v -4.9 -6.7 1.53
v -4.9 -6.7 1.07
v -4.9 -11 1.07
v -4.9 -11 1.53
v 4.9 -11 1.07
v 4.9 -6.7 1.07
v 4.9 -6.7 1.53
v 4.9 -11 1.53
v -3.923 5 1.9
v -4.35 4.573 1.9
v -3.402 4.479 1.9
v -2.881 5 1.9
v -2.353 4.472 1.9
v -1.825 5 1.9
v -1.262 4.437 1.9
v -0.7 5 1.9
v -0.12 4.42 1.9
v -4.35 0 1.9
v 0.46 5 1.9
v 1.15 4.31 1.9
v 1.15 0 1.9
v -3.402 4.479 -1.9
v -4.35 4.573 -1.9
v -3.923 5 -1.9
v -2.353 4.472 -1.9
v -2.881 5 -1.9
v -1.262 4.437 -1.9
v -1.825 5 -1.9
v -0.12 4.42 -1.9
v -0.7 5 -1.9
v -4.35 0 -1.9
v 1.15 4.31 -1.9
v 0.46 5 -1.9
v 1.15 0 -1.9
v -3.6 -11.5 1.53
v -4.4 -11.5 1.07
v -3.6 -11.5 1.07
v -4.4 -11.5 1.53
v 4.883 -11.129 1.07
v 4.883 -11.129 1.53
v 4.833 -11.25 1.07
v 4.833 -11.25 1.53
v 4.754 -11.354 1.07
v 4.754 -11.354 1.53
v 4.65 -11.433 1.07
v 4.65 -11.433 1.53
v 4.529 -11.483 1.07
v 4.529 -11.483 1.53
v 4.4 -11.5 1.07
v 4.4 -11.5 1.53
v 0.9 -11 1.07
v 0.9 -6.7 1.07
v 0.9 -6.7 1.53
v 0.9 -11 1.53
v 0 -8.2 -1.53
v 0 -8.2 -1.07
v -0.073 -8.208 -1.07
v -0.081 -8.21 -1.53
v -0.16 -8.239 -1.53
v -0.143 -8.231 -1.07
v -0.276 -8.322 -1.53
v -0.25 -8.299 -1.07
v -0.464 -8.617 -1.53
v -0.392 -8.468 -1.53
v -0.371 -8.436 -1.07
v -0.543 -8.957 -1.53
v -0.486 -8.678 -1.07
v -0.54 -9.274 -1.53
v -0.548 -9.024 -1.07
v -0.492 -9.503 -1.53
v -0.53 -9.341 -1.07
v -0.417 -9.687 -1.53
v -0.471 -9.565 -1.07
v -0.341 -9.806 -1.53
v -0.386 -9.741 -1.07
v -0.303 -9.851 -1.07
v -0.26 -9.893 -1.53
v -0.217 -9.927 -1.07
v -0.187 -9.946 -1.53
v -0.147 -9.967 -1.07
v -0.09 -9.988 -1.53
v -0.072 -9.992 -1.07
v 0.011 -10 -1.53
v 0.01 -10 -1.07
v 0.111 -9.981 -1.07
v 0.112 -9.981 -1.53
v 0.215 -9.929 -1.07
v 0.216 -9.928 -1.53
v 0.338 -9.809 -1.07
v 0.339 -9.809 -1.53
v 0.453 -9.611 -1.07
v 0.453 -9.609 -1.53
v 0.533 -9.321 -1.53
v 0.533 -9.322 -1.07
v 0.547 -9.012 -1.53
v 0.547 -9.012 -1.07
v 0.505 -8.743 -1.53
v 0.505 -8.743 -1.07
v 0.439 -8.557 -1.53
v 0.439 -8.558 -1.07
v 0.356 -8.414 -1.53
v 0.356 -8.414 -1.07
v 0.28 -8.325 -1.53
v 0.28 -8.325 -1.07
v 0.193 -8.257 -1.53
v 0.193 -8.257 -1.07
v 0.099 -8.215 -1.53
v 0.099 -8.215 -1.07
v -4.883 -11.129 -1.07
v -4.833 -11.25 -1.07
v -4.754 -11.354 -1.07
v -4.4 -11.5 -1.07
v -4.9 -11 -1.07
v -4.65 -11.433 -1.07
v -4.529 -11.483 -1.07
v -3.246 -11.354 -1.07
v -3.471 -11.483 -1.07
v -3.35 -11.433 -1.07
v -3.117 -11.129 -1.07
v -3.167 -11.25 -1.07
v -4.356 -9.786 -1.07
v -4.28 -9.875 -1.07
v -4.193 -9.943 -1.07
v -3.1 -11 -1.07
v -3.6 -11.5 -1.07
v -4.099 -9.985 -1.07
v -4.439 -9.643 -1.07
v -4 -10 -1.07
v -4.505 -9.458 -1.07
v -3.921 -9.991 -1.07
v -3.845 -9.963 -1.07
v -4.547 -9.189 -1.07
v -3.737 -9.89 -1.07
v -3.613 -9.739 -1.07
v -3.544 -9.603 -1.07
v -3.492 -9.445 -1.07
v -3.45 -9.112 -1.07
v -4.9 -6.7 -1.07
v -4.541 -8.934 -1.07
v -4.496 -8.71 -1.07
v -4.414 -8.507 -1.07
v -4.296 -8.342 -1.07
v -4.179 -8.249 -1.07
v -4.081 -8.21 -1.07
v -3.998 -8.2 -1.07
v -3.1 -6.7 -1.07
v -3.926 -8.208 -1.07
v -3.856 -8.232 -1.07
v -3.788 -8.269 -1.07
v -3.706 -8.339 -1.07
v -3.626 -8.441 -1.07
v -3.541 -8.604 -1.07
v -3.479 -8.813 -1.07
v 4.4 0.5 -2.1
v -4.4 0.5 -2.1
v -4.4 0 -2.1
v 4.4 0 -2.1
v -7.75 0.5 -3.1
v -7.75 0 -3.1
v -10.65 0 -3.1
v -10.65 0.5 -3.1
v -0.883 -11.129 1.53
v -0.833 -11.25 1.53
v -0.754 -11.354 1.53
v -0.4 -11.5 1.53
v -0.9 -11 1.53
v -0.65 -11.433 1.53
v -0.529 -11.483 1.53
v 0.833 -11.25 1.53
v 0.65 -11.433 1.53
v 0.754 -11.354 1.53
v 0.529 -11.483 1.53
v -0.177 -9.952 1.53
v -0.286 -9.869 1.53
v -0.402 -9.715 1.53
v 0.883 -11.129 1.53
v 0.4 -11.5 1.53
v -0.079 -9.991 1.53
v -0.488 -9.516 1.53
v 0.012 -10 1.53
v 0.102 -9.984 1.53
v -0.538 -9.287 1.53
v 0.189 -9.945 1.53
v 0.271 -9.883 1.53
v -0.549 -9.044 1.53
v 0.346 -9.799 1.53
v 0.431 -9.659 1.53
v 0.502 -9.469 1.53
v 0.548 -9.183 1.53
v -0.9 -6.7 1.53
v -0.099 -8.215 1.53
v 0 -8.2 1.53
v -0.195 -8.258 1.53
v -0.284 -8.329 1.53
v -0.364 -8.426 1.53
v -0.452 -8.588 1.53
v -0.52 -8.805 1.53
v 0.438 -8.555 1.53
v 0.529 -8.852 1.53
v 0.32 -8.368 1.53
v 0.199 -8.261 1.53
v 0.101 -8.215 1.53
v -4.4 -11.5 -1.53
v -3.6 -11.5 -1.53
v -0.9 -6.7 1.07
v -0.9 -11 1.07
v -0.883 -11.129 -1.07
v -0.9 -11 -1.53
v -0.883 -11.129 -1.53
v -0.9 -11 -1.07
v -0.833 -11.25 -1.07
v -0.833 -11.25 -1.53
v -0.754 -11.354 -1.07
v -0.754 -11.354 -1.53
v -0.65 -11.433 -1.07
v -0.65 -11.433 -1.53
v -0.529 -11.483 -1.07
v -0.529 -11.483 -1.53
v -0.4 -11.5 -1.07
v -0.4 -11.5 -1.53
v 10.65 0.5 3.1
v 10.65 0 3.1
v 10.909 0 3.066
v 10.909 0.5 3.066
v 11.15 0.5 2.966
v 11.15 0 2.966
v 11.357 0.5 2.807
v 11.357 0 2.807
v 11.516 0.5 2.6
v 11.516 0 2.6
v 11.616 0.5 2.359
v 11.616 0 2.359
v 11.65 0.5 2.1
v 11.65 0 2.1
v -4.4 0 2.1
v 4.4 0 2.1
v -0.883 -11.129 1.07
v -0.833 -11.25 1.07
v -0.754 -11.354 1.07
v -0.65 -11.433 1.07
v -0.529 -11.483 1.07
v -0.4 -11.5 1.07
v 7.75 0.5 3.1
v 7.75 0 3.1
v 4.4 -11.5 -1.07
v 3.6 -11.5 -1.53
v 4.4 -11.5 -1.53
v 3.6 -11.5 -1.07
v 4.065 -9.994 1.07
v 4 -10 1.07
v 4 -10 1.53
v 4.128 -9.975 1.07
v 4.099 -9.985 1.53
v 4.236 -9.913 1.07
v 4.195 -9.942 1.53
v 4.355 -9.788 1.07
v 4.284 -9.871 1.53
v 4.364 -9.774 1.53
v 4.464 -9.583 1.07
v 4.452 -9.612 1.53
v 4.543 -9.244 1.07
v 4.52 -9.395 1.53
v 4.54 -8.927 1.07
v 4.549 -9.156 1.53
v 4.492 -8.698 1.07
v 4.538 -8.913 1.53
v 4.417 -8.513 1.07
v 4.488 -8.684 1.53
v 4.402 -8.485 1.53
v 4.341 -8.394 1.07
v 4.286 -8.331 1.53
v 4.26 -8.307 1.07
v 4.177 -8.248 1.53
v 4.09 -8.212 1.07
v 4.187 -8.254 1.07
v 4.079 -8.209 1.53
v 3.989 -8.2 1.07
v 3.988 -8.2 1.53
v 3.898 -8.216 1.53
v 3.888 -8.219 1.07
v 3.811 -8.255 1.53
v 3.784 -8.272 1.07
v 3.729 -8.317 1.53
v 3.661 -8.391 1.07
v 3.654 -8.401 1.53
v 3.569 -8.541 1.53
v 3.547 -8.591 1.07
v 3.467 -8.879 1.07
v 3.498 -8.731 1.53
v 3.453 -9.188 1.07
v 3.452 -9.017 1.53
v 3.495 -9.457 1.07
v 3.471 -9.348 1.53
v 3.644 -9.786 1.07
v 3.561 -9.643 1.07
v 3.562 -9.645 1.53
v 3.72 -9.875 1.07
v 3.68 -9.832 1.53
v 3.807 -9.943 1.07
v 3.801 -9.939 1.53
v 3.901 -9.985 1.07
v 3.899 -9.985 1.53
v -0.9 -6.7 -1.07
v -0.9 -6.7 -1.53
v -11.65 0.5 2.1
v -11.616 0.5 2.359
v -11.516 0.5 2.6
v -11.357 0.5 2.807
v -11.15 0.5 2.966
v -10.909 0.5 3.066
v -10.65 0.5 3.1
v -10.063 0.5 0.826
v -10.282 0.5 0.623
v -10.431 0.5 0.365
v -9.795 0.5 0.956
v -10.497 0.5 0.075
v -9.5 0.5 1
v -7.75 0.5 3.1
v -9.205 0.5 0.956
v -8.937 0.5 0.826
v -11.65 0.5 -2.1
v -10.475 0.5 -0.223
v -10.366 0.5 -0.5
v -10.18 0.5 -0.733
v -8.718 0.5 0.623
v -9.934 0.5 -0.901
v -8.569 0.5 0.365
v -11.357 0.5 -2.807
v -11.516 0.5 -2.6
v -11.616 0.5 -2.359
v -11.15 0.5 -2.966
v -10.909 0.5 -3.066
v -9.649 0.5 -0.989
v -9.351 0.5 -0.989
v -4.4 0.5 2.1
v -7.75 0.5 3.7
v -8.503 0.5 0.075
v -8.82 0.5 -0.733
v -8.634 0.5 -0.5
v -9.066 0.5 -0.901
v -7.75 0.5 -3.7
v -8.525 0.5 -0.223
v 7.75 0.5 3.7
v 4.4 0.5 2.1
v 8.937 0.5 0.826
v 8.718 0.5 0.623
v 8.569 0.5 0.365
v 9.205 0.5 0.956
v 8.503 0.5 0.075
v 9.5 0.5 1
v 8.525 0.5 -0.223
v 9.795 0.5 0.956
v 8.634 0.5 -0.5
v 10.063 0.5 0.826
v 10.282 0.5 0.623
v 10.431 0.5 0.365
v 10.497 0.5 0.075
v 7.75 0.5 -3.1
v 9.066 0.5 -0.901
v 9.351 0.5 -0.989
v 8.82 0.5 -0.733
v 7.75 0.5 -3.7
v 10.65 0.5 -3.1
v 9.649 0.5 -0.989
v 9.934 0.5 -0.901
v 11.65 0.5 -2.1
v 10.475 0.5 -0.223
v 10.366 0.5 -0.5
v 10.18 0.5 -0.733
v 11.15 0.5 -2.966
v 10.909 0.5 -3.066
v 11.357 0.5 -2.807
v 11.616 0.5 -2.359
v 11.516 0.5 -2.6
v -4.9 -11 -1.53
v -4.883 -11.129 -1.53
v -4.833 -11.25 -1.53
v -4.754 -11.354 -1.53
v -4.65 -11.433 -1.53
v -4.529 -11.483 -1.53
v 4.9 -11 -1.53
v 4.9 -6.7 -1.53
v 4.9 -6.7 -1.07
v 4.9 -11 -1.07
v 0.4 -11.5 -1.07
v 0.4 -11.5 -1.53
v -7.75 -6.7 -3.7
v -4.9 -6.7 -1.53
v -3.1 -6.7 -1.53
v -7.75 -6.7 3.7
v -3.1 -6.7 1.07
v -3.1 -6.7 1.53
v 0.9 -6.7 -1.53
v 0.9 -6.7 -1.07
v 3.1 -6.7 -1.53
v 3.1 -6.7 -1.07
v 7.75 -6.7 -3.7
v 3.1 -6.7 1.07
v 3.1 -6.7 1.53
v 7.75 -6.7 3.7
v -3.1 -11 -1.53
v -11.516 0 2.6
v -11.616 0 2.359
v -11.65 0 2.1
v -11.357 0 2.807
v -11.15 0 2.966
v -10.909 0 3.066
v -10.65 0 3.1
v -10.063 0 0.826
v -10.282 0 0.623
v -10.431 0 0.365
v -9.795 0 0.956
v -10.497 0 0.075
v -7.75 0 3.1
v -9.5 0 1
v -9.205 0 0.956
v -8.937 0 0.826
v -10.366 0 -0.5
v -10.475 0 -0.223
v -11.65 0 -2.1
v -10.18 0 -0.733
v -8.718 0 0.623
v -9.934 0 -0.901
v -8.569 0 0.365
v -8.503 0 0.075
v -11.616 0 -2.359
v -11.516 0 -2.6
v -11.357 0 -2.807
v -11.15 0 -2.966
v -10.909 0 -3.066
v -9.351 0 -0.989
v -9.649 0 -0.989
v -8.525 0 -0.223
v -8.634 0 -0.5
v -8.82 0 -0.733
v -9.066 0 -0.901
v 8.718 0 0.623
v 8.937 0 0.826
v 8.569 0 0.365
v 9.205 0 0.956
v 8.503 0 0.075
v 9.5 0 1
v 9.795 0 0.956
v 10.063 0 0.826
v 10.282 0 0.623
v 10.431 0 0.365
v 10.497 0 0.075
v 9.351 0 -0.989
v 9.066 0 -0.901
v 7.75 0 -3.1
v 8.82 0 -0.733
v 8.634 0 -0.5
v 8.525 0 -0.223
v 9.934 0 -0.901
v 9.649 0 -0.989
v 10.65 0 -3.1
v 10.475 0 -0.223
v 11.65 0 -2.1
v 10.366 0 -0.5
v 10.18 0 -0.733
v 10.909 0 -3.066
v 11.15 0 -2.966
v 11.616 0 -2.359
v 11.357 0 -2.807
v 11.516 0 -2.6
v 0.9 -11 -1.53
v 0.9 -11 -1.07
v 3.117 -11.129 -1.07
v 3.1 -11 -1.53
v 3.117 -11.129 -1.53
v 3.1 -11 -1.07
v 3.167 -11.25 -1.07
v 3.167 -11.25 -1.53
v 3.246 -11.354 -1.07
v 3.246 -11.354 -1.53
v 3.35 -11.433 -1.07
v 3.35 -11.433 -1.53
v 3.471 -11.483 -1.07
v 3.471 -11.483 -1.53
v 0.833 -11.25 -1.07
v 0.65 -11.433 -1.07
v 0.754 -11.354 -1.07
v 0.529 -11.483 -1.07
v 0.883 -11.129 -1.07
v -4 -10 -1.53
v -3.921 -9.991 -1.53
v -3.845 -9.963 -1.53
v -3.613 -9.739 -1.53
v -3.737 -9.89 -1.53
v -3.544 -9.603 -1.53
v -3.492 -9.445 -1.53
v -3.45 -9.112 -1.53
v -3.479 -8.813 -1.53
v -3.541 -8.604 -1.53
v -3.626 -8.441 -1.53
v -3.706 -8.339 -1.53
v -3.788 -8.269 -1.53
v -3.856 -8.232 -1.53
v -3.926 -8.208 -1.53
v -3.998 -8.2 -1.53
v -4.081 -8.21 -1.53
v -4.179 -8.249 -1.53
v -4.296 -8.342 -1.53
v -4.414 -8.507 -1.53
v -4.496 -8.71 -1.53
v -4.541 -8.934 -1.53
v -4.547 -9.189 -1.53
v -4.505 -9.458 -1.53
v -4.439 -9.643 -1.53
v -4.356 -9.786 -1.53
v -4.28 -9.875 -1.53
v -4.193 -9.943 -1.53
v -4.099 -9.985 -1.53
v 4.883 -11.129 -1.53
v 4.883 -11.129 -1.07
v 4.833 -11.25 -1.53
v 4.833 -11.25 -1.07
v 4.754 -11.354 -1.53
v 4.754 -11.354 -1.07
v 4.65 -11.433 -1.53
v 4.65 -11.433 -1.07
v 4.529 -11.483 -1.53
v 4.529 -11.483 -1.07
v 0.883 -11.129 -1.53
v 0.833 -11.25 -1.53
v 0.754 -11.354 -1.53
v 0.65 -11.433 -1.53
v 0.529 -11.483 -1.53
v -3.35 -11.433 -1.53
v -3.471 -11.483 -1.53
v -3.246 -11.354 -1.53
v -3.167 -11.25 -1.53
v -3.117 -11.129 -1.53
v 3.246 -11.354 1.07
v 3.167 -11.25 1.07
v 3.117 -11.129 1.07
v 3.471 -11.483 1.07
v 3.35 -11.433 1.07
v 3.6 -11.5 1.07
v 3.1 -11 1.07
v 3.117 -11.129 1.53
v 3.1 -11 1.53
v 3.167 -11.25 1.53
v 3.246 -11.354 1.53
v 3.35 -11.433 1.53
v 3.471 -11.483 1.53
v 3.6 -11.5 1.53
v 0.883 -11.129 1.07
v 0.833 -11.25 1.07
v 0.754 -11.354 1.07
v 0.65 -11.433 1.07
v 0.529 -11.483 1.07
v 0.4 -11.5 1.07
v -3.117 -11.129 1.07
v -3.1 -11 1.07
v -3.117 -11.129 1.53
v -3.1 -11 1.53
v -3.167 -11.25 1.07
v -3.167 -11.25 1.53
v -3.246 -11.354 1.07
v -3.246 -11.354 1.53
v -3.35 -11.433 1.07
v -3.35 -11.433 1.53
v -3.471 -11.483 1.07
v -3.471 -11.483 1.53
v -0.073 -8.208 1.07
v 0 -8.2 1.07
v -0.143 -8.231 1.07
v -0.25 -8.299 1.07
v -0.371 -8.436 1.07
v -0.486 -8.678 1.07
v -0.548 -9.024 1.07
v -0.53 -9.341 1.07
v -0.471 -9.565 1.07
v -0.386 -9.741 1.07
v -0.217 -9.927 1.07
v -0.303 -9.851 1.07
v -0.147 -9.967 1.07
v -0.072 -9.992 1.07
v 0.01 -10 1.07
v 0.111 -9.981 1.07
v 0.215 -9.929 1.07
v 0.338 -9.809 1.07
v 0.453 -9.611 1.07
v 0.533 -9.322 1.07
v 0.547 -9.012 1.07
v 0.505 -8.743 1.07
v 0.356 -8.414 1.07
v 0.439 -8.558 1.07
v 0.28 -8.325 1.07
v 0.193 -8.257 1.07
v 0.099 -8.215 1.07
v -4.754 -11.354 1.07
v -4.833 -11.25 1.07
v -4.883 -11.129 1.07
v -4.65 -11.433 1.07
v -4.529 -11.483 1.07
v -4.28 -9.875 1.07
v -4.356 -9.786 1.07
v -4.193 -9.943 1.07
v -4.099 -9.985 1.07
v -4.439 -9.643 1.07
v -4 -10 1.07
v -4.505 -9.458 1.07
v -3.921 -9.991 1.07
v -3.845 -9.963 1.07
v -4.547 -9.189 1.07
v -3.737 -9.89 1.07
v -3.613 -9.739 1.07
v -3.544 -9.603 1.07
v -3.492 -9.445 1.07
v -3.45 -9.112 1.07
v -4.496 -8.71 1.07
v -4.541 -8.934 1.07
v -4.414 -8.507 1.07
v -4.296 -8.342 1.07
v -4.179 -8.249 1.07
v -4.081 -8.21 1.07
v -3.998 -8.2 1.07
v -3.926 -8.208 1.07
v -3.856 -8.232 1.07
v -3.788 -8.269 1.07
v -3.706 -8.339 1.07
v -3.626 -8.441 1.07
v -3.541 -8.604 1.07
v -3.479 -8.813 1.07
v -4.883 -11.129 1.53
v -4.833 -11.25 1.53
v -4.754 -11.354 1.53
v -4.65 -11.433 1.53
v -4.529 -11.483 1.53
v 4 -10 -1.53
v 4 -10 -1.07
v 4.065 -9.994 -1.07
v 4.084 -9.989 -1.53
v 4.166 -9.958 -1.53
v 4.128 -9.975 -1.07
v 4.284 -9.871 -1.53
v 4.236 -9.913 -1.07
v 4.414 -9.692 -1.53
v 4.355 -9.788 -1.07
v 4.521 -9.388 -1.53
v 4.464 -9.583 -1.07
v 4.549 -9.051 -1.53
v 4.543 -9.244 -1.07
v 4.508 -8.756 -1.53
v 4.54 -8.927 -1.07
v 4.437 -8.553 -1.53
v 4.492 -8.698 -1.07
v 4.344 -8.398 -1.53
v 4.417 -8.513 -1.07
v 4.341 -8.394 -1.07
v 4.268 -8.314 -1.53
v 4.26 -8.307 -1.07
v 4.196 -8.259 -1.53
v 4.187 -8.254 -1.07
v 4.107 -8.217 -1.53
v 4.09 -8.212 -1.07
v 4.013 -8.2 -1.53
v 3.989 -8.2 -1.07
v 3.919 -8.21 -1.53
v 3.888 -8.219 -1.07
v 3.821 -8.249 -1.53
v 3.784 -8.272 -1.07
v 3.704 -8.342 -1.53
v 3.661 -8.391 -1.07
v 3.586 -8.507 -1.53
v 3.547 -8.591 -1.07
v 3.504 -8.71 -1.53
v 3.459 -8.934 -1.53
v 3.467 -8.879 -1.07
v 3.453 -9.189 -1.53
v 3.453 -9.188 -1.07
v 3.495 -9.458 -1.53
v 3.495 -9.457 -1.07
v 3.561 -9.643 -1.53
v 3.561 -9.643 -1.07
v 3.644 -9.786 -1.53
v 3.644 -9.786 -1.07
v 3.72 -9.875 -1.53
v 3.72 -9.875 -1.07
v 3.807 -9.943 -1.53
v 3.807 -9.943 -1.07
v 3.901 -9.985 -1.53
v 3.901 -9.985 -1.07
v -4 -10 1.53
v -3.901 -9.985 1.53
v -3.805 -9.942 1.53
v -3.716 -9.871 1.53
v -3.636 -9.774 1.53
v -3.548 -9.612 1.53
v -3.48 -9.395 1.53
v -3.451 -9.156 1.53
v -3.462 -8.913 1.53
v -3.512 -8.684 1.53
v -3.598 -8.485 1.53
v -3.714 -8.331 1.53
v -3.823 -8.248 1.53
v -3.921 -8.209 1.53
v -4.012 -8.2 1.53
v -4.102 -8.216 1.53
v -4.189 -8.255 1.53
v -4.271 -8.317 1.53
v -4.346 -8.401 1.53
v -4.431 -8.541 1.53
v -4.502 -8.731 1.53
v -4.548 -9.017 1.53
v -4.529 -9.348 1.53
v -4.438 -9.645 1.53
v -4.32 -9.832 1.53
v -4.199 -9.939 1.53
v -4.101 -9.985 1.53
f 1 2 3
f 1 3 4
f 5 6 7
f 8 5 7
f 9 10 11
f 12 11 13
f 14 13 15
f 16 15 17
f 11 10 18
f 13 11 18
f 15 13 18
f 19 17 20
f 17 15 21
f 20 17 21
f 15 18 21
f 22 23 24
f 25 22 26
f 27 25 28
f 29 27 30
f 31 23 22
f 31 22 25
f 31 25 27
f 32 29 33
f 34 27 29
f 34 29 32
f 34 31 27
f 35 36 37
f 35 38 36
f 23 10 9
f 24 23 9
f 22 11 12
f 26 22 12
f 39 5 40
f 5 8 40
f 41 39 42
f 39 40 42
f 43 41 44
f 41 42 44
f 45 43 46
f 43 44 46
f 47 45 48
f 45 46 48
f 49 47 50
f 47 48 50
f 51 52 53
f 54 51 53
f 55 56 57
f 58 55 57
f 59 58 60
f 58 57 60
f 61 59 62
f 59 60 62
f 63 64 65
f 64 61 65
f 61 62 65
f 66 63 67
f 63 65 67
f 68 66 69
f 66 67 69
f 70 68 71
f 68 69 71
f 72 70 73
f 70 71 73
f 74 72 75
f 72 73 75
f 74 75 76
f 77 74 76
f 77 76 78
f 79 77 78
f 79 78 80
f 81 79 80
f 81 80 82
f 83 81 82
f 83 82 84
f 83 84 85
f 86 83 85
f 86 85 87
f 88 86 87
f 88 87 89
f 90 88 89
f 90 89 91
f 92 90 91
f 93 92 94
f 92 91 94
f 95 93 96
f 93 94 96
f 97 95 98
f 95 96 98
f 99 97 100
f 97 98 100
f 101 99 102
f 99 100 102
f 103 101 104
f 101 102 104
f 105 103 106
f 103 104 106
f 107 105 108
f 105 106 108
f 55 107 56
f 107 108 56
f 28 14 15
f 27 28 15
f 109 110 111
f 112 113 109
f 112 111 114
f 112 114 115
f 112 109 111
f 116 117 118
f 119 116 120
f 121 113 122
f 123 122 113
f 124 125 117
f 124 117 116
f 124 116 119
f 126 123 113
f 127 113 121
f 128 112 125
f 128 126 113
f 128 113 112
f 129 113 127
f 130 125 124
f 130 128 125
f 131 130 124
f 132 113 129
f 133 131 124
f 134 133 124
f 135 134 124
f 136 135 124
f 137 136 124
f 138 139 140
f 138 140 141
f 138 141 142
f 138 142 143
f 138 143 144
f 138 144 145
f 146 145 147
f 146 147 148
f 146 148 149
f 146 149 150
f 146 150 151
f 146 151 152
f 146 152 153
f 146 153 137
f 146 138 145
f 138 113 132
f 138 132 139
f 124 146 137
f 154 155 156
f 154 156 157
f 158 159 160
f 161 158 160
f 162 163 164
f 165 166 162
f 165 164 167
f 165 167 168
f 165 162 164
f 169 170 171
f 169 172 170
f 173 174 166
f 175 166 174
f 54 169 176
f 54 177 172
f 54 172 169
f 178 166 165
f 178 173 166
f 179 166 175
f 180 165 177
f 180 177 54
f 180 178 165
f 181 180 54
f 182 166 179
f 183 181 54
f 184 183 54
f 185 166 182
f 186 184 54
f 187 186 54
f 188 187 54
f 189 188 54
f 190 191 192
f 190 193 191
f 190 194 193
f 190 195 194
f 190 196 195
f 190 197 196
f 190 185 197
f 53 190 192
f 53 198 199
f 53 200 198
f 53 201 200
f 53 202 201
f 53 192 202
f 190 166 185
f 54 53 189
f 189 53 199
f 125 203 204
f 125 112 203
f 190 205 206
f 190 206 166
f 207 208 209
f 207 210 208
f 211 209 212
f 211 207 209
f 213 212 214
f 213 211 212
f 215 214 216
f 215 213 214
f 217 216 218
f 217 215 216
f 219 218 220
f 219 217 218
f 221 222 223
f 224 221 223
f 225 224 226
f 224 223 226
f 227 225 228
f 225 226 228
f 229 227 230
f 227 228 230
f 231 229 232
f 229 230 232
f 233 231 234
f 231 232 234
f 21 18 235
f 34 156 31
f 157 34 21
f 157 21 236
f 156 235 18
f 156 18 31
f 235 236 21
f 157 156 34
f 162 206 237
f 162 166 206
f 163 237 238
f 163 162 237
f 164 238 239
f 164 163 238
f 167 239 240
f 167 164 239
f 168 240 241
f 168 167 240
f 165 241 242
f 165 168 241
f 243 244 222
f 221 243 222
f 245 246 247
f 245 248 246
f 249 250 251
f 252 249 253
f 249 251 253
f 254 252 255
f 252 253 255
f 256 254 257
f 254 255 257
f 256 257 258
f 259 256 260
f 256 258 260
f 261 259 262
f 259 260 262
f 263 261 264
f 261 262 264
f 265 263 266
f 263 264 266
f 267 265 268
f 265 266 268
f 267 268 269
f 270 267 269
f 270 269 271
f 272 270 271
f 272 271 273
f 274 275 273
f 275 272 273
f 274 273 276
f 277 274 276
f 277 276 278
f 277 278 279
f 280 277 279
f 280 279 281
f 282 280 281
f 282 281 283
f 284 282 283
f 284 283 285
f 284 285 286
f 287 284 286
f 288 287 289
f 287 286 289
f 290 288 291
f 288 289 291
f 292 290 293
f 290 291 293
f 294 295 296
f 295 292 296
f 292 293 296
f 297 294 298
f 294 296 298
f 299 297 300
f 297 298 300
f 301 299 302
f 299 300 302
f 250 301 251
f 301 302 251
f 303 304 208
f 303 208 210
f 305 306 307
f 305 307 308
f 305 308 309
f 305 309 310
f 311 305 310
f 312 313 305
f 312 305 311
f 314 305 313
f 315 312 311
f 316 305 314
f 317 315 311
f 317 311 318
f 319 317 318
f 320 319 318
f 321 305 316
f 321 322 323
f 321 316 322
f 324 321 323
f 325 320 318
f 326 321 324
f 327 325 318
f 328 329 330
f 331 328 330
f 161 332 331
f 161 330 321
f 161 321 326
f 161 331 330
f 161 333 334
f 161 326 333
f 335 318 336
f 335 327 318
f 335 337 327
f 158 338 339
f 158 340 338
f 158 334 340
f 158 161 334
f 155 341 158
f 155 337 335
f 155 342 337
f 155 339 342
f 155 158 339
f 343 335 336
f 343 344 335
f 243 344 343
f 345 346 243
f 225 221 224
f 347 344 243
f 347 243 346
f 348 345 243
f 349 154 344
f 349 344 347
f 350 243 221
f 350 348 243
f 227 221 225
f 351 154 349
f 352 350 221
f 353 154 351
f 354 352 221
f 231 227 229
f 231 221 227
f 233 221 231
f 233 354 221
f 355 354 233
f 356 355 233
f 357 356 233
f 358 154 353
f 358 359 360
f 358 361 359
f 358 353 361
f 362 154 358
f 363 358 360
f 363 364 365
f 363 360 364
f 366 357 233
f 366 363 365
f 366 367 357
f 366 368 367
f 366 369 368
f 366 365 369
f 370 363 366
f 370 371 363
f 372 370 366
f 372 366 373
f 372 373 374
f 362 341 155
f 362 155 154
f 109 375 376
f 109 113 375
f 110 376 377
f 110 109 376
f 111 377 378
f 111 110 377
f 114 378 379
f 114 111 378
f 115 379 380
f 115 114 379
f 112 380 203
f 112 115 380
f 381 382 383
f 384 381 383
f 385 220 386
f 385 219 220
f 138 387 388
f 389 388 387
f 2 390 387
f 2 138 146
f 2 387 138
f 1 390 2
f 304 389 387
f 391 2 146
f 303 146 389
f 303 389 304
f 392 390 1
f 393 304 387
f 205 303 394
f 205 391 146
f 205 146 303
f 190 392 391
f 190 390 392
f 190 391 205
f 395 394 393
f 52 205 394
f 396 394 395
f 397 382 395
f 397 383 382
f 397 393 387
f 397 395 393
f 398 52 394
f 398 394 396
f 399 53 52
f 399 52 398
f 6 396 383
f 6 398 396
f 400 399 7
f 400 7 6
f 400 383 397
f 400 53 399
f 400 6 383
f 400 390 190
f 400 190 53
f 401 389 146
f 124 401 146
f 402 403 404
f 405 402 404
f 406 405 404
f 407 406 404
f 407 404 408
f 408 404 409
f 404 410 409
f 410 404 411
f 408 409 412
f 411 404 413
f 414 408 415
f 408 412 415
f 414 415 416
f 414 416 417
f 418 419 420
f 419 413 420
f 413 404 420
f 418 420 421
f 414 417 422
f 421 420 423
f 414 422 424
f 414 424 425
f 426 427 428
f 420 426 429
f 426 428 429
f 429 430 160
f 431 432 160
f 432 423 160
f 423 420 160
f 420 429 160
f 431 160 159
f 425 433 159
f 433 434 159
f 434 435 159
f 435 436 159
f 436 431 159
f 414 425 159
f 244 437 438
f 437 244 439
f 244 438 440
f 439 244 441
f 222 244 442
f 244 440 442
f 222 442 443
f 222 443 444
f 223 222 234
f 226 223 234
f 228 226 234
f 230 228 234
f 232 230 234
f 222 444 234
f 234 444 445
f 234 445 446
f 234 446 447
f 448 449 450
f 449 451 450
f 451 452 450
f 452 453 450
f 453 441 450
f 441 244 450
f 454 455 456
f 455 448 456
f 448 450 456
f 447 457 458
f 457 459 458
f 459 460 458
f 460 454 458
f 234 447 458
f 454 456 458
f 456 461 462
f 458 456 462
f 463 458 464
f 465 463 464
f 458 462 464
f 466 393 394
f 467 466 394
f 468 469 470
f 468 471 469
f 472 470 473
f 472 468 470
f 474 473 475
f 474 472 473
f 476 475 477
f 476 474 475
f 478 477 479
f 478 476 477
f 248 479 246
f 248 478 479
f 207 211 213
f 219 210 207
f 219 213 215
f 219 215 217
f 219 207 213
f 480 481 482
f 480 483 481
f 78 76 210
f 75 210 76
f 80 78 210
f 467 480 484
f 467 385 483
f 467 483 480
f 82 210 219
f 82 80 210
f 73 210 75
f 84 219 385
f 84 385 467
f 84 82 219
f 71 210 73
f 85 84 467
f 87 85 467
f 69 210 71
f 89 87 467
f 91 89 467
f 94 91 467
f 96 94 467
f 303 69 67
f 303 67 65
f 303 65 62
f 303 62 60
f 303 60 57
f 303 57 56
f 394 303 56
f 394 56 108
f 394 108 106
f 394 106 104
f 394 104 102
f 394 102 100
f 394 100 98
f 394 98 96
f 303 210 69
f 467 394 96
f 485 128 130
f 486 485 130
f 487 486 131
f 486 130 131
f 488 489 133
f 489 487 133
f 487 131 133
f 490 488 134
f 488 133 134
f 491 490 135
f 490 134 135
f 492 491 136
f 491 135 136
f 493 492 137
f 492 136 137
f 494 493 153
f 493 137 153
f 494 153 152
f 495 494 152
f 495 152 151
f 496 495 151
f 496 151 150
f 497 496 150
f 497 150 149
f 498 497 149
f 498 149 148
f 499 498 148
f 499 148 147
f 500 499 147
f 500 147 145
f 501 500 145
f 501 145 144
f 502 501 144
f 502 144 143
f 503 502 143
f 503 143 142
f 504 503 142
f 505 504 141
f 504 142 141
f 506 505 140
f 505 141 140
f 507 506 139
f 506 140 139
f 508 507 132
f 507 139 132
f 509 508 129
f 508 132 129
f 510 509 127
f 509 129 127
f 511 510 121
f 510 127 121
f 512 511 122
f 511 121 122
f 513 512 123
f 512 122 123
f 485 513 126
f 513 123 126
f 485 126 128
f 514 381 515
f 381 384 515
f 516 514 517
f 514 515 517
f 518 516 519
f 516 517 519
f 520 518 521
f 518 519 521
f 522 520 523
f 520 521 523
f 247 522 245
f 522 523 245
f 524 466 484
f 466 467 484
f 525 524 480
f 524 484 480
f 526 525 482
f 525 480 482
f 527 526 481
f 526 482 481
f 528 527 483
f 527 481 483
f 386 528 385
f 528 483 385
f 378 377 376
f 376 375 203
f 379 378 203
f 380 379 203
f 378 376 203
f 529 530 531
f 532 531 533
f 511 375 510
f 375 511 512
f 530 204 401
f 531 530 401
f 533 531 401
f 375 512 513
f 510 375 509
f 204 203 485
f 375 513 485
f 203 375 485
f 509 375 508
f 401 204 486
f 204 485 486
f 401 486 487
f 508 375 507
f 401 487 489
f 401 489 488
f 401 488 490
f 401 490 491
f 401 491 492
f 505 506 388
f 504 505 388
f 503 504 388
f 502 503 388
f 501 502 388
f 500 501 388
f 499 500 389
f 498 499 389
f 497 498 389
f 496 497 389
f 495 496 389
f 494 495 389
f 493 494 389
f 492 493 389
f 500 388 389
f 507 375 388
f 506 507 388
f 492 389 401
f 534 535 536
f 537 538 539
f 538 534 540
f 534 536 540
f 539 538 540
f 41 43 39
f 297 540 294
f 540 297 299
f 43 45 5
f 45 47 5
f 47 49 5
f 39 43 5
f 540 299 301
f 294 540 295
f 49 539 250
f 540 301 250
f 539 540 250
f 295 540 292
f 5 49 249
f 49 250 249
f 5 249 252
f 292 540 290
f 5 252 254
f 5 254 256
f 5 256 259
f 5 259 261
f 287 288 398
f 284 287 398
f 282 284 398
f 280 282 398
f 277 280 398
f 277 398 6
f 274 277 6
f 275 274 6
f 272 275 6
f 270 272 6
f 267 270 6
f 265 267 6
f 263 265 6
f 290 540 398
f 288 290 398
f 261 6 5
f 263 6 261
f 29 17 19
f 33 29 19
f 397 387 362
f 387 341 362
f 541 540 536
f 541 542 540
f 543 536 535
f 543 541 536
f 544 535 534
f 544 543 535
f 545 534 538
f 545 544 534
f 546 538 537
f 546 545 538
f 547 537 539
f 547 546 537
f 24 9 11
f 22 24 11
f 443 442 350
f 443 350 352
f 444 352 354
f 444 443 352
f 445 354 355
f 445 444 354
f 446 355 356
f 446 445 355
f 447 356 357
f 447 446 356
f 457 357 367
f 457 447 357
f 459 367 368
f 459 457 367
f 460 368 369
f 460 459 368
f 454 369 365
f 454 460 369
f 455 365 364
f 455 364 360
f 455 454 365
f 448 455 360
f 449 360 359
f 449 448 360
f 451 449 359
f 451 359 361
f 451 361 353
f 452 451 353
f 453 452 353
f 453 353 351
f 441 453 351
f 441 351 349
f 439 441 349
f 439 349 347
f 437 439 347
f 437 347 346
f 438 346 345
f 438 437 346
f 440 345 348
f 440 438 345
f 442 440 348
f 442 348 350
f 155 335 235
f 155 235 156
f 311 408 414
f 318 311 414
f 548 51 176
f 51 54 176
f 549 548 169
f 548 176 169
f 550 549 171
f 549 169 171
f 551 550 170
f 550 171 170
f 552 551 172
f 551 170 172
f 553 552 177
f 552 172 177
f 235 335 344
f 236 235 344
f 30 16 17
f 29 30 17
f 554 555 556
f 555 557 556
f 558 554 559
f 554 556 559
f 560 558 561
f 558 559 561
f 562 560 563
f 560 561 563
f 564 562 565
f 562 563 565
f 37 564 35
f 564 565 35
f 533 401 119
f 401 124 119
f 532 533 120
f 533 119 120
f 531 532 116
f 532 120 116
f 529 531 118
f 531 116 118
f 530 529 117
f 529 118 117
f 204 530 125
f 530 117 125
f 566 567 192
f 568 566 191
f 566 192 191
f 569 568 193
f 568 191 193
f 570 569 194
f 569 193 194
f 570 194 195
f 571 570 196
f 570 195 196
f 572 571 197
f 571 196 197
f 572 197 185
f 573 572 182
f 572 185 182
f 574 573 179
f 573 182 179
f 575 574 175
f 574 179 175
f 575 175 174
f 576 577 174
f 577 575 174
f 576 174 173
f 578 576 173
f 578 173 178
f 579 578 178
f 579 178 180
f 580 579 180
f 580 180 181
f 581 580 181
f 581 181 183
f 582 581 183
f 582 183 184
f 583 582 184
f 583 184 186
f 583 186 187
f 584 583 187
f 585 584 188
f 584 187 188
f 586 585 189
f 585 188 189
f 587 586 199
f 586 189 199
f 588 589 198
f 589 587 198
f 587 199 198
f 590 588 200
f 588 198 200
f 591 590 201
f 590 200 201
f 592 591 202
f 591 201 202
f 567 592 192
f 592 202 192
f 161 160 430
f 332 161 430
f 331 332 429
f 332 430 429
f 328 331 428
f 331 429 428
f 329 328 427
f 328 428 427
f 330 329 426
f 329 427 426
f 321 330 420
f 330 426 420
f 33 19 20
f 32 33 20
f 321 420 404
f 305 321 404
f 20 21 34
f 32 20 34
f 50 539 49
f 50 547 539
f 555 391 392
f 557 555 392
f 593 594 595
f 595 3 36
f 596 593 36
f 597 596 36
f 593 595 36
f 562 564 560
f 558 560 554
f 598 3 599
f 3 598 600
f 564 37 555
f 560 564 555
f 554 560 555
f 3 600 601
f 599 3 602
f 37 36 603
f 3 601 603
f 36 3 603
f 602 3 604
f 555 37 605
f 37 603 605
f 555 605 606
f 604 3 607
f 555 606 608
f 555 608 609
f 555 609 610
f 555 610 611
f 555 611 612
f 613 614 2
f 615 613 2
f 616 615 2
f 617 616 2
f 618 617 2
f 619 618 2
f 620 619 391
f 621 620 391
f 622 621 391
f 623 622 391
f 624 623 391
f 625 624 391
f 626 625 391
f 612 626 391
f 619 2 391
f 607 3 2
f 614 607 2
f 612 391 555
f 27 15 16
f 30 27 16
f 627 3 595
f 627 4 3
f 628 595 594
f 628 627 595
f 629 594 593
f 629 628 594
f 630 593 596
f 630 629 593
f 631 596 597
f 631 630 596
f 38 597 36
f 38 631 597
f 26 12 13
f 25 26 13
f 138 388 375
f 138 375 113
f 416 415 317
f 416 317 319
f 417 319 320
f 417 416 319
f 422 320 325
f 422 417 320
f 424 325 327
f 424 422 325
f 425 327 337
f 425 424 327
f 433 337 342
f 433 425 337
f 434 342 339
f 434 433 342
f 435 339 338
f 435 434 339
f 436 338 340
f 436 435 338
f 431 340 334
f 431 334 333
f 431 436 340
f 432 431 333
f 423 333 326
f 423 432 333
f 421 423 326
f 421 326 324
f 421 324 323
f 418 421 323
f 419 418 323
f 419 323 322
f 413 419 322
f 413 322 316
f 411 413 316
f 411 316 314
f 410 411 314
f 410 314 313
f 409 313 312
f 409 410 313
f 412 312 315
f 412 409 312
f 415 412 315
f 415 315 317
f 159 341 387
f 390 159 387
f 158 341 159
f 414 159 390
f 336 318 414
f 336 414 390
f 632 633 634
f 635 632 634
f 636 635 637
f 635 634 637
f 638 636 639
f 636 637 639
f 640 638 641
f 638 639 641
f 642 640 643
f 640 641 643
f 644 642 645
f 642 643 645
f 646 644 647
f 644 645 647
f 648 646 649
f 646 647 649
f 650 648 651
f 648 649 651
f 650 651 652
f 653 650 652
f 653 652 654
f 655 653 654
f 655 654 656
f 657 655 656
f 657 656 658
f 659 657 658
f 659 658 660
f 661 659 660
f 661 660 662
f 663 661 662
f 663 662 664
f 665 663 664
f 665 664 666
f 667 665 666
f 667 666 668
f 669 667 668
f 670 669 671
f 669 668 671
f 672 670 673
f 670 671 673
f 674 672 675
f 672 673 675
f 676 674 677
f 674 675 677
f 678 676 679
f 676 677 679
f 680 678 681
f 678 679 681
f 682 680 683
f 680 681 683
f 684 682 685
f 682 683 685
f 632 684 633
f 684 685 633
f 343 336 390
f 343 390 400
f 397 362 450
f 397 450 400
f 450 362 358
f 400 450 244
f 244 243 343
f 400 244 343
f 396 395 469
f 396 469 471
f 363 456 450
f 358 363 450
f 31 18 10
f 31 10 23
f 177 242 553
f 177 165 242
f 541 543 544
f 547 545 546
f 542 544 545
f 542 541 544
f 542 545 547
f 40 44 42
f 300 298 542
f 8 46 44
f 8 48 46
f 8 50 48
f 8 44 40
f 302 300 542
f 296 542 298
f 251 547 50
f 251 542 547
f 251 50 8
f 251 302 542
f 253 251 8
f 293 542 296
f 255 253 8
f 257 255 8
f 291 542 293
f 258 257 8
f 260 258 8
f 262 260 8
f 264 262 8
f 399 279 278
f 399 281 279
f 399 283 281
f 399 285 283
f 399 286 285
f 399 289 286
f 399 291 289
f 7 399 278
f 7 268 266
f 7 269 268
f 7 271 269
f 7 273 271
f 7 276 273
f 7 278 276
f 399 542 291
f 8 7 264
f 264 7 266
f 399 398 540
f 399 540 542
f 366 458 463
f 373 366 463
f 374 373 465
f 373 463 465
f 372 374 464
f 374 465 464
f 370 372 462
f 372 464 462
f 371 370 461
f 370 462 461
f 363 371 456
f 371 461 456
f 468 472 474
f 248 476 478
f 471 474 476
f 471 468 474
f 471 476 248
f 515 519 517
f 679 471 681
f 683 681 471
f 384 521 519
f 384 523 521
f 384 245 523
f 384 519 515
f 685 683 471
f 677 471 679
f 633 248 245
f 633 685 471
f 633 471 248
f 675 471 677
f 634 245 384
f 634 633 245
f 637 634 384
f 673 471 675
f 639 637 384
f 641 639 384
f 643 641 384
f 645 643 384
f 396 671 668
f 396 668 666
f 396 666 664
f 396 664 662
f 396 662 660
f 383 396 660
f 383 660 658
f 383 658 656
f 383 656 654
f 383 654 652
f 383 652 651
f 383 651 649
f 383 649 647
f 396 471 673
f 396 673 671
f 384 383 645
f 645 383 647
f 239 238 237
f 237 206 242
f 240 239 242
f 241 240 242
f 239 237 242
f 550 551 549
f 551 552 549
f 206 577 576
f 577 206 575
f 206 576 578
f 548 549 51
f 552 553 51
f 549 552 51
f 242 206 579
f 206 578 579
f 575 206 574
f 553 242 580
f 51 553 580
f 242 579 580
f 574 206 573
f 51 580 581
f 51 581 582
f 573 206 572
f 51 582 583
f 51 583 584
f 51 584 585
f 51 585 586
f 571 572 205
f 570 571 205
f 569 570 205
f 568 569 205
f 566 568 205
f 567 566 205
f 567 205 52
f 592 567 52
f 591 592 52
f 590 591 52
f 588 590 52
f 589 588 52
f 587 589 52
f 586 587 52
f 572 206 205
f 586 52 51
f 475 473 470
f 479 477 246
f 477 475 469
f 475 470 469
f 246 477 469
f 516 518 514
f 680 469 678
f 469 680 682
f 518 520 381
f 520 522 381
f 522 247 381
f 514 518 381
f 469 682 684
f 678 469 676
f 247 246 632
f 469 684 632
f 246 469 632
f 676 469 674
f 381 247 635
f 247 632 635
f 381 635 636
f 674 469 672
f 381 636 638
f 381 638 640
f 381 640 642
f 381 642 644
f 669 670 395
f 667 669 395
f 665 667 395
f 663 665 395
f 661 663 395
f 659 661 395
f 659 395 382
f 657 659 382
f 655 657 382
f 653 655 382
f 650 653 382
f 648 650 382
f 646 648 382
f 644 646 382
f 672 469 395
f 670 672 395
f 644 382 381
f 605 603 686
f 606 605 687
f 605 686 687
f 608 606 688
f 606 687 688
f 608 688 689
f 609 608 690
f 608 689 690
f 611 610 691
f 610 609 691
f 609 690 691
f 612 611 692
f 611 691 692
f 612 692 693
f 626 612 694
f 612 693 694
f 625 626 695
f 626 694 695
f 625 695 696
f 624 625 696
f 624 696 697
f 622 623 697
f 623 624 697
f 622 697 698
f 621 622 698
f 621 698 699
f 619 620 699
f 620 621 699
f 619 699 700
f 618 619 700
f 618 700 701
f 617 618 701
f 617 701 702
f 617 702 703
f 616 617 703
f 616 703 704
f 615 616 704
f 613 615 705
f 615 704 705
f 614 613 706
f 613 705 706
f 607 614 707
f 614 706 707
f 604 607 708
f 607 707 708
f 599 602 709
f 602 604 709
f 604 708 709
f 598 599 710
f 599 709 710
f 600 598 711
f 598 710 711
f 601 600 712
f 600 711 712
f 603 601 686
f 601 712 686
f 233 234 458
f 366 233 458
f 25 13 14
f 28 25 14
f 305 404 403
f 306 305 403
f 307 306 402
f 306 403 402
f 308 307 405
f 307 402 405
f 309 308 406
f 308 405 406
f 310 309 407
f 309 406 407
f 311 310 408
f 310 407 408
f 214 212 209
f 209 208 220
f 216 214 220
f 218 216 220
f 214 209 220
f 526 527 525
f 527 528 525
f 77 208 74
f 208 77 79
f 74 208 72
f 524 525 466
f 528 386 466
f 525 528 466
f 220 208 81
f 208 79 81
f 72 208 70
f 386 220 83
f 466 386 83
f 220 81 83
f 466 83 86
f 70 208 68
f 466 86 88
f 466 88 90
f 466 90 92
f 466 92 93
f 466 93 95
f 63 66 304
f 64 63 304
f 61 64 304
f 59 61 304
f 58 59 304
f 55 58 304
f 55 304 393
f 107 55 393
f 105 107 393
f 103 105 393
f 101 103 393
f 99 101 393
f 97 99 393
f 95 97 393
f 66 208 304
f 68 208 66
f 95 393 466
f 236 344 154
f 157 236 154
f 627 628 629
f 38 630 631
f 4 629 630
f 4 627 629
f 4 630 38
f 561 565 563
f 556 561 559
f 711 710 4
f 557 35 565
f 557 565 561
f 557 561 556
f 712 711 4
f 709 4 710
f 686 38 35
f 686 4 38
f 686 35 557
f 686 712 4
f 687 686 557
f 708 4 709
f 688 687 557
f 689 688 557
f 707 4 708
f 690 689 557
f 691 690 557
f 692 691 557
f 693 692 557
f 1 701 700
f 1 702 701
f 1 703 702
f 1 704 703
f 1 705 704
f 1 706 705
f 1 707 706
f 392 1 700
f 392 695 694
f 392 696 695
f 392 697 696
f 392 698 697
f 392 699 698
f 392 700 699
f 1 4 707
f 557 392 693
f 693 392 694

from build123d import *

# Parameters (mm, degrees)
CROQUIS1_R              = 1
SALIENTE_EXTRUIR1_DEPTH = 0.5
CROQUIS2_W              = 15.5
CROQUIS2_H              = 7.4
SALIENTE_EXTRUIR2_DEPTH = 6.7
CROQUIS3_W              = 1.8
CROQUIS3_H              = 0.46
SALIENTE_EXTRUIR3_DEPTH = 4.8
CROQUIS4_W              = 8.8
CROQUIS4_H              = 4.2
CORTAR_EXTRUIR1_DEPTH   = 0.5
CROQUIS5_W              = 5.5
CROQUIS5_H              = 3.8
SALIENTE_EXTRUIR4_DEPTH = 5
CORTAR_EXTRUIR2_REACH   = 19.185
CROQUIS6_RX             = 0.9
CROQUIS6_RY             = 0.55
REDONDEO2_R             = 0.5
CORTAR_EXTRUIR3_REACH   = 19.301


with BuildPart() as part:
    # Croquis1 → Saliente-Extruir1 (new body)
    with BuildSketch(Plane(origin=(0, 0, 0), x_dir=(1, 0, 0), z_dir=(0, 1, 0))):
        with BuildLine():
            Line((10.65, 3.1), (7.75, 3.1))
            Line((7.75, 3.1), (7.75, 3.7))
            Line((7.75, 3.7), (-7.75, 3.7))
            Line((-7.75, 3.7), (-7.75, 3.1))
            Line((-7.75, 3.1), (-10.65, 3.1))
            ThreePointArc((-10.65, 3.1), (-11.357106781, 2.807106781), (-11.65, 2.1))
            Line((-11.65, 2.1), (-11.65, -2.1))
            ThreePointArc((-11.65, -2.1), (-11.357106781, -2.807106781), (-10.65, -3.1))
            Line((-10.65, -3.1), (-7.75, -3.1))
            Line((-7.75, -3.1), (-7.75, -3.7))
            Line((-7.75, -3.7), (7.75, -3.7))
            Line((7.75, -3.7), (7.75, -3.1))
            Line((7.75, -3.1), (10.65, -3.1))
            ThreePointArc((10.65, -3.1), (11.357106781, -2.807106781), (11.65, -2.1))
            Line((11.65, -2.1), (11.65, 2.1))
            ThreePointArc((11.65, 2.1), (11.357106781, 2.807106781), (10.65, 3.1))
        make_face()
        with Locations(Location((9.5, 0, 0), (0, 0, 270))):
            Circle(CROQUIS1_R, mode=Mode.SUBTRACT)
        with Locations(Location((-9.5, 0, 0), (0, 0, 270))):
            Circle(CROQUIS1_R, mode=Mode.SUBTRACT)
    extrude(amount=SALIENTE_EXTRUIR1_DEPTH)

    # Croquis2 → Saliente-Extruir2 (add)
    with BuildSketch(Plane.XZ):
        Rectangle(CROQUIS2_W, CROQUIS2_H)
    extrude(amount=SALIENTE_EXTRUIR2_DEPTH)

    # Croquis3 → Saliente-Extruir3 (add)
    with BuildSketch(Plane.XZ.offset(6.7)):
        with Locations((0, -1.3)):
            Rectangle(CROQUIS3_W, CROQUIS3_H)
        with Locations((-4, -1.3)):
            Rectangle(CROQUIS3_W, CROQUIS3_H)
        with Locations((4, -1.3)):
            Rectangle(CROQUIS3_W, CROQUIS3_H)
        with Locations((4, 1.3)):
            Rectangle(CROQUIS3_W, CROQUIS3_H)
        with Locations((-4, 1.3)):
            Rectangle(CROQUIS3_W, CROQUIS3_H)
        with Locations((0, 1.3)):
            Rectangle(CROQUIS3_W, CROQUIS3_H)
    extrude(amount=SALIENTE_EXTRUIR3_DEPTH)

    # Croquis4 → Cortar-Extruir1 (cut)
    with BuildSketch(Plane(origin=(0, 0.5, 0), x_dir=(1, 0, 0), z_dir=(0, 1, 0))):
        Rectangle(CROQUIS4_W, CROQUIS4_H)
    extrude(amount=-CORTAR_EXTRUIR1_DEPTH, mode=Mode.SUBTRACT)

    # Croquis5 → Saliente-Extruir4 (add)
    with BuildSketch(Plane(origin=(0, 0, 0), x_dir=(1, 0, 0), z_dir=(0, 1, 0))):
        with Locations((-1.6, 0)):
            Rectangle(CROQUIS5_W, CROQUIS5_H)
    extrude(amount=SALIENTE_EXTRUIR4_DEPTH)

    # Cortar-Extruir2: up to this face of the body (flat: up to its plane)
    cortar_extruir2_end = Plane(part.part.faces().sort_by_distance((-4, -9.1, -1.53))[0])
    # Croquis6 → Cortar-Extruir2 (cut, up to the picked face)
    with BuildSketch(Plane.XY.offset(1.53), mode=Mode.PRIVATE) as cortar_extruir2_sk1:
        with Locations(Location((-4, -9.1), (0, 0, -90))):
            Ellipse(CROQUIS6_RX, CROQUIS6_RY)
    cortar_extruir2_tool1 = split(extrude(cortar_extruir2_sk1.sketch, amount=-CORTAR_EXTRUIR2_REACH, mode=Mode.PRIVATE), bisect_by=cortar_extruir2_end, keep=Keep.BOTH, mode=Mode.PRIVATE)
    # Croquis6 → Cortar-Extruir2 (cut, up to the picked face)
    with BuildSketch(Plane.XY.offset(1.53), mode=Mode.PRIVATE) as cortar_extruir2_sk2:
        with Locations(Location((0, -9.1), (0, 0, 90))):
            Ellipse(CROQUIS6_RX, CROQUIS6_RY)
    cortar_extruir2_tool2 = split(extrude(cortar_extruir2_sk2.sketch, amount=-CORTAR_EXTRUIR2_REACH, mode=Mode.PRIVATE), bisect_by=cortar_extruir2_end, keep=Keep.BOTH, mode=Mode.PRIVATE)
    # Croquis6 → Cortar-Extruir2 (cut, up to the picked face)
    with BuildSketch(Plane.XY.offset(1.53), mode=Mode.PRIVATE) as cortar_extruir2_sk3:
        with Locations(Location((4, -9.1), (0, 0, -90))):
            Ellipse(CROQUIS6_RX, CROQUIS6_RY)
    cortar_extruir2_tool3 = split(extrude(cortar_extruir2_sk3.sketch, amount=-CORTAR_EXTRUIR2_REACH, mode=Mode.PRIVATE), bisect_by=cortar_extruir2_end, keep=Keep.BOTH, mode=Mode.PRIVATE)
    add(cortar_extruir2_tool1.solids().sort_by(Axis((-4, -9.1, 1.53), (0, 0, -1)))[0], mode=Mode.SUBTRACT)
    add(cortar_extruir2_tool2.solids().sort_by(Axis((0, -9.1, 1.53), (0, 0, -1)))[0], mode=Mode.SUBTRACT)
    add(cortar_extruir2_tool3.solids().sort_by(Axis((4, -9.1, 1.53), (0, 0, -1)))[0], mode=Mode.SUBTRACT)

    # Redondeo2
    redondeo2_edges = [part.edges().sort_by_distance(p)[0] for p in [
        (0.9, -11.5, 1.3),
        (-0.9, -11.5, 1.3),
        (4.9, -11.5, 1.3),
        (3.1, -11.5, 1.3),
        (-3.1, -11.5, 1.3),
        (-4.9, -11.5, 1.3),
        (-0.9, -11.5, -1.3),
        (0.9, -11.5, -1.3),
        (-4.9, -11.5, -1.3),
        (-3.1, -11.5, -1.3),
        (3.1, -11.5, -1.3),
        (4.9, -11.5, -1.3),
    ]]
    fillet(redondeo2_edges, radius=REDONDEO2_R)

    # Croquis7 → Cortar-Extruir3 (cut, up to next)
    with BuildSketch(Plane.XY.offset(1.9), mode=Mode.PRIVATE) as cortar_extruir3_sk1:
        Polygon((-3.923177813, 5), (-4.35, 5), (-4.35, 4.573177813), align=None)
    cortar_extruir3_tool1 = extrude(cortar_extruir3_sk1.sketch, amount=-CORTAR_EXTRUIR3_REACH, mode=Mode.PRIVATE) & part.part
    # Croquis7 → Cortar-Extruir3 (cut, up to next)
    with BuildSketch(Plane.XY.offset(1.9), mode=Mode.PRIVATE) as cortar_extruir3_sk2:
        Polygon((1.15, 5), (0.460006212, 5), (1.15, 4.310006212), align=None)
    cortar_extruir3_tool2 = extrude(cortar_extruir3_sk2.sketch, amount=-CORTAR_EXTRUIR3_REACH, mode=Mode.PRIVATE) & part.part
    # Croquis7 → Cortar-Extruir3 (cut, up to next)
    with BuildSketch(Plane.XY.offset(1.9), mode=Mode.PRIVATE) as cortar_extruir3_sk3:
        Polygon((0.460006212, 5), (-0.699513597, 5), (-0.119753693, 4.420240095), align=None)
    cortar_extruir3_tool3 = extrude(cortar_extruir3_sk3.sketch, amount=-CORTAR_EXTRUIR3_REACH, mode=Mode.PRIVATE) & part.part
    # Croquis7 → Cortar-Extruir3 (cut, up to next)
    with BuildSketch(Plane.XY.offset(1.9), mode=Mode.PRIVATE) as cortar_extruir3_sk4:
        Polygon((-0.699513597, 5), (-1.824858034, 5), (-1.262185815, 4.437327782), align=None)
    cortar_extruir3_tool4 = extrude(cortar_extruir3_sk4.sketch, amount=-CORTAR_EXTRUIR3_REACH, mode=Mode.PRIVATE) & part.part
    # Croquis7 → Cortar-Extruir3 (cut, up to next)
    with BuildSketch(Plane.XY.offset(1.9), mode=Mode.PRIVATE) as cortar_extruir3_sk5:
        Polygon((-1.824858034, 5), (-2.880534962, 5), (-2.352696498, 4.472161536), align=None)
    cortar_extruir3_tool5 = extrude(cortar_extruir3_sk5.sketch, amount=-CORTAR_EXTRUIR3_REACH, mode=Mode.PRIVATE) & part.part
    # Croquis7 → Cortar-Extruir3 (cut, up to next)
    with BuildSketch(Plane.XY.offset(1.9), mode=Mode.PRIVATE) as cortar_extruir3_sk6:
        Polygon((-2.880534962, 5), (-3.923177813, 5), (-3.401856388, 4.478678575), align=None)
    cortar_extruir3_tool6 = extrude(cortar_extruir3_sk6.sketch, amount=-CORTAR_EXTRUIR3_REACH, mode=Mode.PRIVATE) & part.part
    add(cortar_extruir3_tool1.solids().sort_by_distance((-4.207726, 4.857726, 1.9))[0], mode=Mode.SUBTRACT)
    add(cortar_extruir3_tool2.solids().sort_by_distance((0.920002, 4.770002, 1.9))[0], mode=Mode.SUBTRACT)
    add(cortar_extruir3_tool3.solids().sort_by_distance((-0.119754, 4.806747, 1.9))[0], mode=Mode.SUBTRACT)
    add(cortar_extruir3_tool4.solids().sort_by_distance((-1.262186, 4.812443, 1.9))[0], mode=Mode.SUBTRACT)
    add(cortar_extruir3_tool5.solids().sort_by_distance((-2.352696, 4.824054, 1.9))[0], mode=Mode.SUBTRACT)
    add(cortar_extruir3_tool6.solids().sort_by_distance((-3.401856, 4.826226, 1.9))[0], mode=Mode.SUBTRACT)


solid = part.part
